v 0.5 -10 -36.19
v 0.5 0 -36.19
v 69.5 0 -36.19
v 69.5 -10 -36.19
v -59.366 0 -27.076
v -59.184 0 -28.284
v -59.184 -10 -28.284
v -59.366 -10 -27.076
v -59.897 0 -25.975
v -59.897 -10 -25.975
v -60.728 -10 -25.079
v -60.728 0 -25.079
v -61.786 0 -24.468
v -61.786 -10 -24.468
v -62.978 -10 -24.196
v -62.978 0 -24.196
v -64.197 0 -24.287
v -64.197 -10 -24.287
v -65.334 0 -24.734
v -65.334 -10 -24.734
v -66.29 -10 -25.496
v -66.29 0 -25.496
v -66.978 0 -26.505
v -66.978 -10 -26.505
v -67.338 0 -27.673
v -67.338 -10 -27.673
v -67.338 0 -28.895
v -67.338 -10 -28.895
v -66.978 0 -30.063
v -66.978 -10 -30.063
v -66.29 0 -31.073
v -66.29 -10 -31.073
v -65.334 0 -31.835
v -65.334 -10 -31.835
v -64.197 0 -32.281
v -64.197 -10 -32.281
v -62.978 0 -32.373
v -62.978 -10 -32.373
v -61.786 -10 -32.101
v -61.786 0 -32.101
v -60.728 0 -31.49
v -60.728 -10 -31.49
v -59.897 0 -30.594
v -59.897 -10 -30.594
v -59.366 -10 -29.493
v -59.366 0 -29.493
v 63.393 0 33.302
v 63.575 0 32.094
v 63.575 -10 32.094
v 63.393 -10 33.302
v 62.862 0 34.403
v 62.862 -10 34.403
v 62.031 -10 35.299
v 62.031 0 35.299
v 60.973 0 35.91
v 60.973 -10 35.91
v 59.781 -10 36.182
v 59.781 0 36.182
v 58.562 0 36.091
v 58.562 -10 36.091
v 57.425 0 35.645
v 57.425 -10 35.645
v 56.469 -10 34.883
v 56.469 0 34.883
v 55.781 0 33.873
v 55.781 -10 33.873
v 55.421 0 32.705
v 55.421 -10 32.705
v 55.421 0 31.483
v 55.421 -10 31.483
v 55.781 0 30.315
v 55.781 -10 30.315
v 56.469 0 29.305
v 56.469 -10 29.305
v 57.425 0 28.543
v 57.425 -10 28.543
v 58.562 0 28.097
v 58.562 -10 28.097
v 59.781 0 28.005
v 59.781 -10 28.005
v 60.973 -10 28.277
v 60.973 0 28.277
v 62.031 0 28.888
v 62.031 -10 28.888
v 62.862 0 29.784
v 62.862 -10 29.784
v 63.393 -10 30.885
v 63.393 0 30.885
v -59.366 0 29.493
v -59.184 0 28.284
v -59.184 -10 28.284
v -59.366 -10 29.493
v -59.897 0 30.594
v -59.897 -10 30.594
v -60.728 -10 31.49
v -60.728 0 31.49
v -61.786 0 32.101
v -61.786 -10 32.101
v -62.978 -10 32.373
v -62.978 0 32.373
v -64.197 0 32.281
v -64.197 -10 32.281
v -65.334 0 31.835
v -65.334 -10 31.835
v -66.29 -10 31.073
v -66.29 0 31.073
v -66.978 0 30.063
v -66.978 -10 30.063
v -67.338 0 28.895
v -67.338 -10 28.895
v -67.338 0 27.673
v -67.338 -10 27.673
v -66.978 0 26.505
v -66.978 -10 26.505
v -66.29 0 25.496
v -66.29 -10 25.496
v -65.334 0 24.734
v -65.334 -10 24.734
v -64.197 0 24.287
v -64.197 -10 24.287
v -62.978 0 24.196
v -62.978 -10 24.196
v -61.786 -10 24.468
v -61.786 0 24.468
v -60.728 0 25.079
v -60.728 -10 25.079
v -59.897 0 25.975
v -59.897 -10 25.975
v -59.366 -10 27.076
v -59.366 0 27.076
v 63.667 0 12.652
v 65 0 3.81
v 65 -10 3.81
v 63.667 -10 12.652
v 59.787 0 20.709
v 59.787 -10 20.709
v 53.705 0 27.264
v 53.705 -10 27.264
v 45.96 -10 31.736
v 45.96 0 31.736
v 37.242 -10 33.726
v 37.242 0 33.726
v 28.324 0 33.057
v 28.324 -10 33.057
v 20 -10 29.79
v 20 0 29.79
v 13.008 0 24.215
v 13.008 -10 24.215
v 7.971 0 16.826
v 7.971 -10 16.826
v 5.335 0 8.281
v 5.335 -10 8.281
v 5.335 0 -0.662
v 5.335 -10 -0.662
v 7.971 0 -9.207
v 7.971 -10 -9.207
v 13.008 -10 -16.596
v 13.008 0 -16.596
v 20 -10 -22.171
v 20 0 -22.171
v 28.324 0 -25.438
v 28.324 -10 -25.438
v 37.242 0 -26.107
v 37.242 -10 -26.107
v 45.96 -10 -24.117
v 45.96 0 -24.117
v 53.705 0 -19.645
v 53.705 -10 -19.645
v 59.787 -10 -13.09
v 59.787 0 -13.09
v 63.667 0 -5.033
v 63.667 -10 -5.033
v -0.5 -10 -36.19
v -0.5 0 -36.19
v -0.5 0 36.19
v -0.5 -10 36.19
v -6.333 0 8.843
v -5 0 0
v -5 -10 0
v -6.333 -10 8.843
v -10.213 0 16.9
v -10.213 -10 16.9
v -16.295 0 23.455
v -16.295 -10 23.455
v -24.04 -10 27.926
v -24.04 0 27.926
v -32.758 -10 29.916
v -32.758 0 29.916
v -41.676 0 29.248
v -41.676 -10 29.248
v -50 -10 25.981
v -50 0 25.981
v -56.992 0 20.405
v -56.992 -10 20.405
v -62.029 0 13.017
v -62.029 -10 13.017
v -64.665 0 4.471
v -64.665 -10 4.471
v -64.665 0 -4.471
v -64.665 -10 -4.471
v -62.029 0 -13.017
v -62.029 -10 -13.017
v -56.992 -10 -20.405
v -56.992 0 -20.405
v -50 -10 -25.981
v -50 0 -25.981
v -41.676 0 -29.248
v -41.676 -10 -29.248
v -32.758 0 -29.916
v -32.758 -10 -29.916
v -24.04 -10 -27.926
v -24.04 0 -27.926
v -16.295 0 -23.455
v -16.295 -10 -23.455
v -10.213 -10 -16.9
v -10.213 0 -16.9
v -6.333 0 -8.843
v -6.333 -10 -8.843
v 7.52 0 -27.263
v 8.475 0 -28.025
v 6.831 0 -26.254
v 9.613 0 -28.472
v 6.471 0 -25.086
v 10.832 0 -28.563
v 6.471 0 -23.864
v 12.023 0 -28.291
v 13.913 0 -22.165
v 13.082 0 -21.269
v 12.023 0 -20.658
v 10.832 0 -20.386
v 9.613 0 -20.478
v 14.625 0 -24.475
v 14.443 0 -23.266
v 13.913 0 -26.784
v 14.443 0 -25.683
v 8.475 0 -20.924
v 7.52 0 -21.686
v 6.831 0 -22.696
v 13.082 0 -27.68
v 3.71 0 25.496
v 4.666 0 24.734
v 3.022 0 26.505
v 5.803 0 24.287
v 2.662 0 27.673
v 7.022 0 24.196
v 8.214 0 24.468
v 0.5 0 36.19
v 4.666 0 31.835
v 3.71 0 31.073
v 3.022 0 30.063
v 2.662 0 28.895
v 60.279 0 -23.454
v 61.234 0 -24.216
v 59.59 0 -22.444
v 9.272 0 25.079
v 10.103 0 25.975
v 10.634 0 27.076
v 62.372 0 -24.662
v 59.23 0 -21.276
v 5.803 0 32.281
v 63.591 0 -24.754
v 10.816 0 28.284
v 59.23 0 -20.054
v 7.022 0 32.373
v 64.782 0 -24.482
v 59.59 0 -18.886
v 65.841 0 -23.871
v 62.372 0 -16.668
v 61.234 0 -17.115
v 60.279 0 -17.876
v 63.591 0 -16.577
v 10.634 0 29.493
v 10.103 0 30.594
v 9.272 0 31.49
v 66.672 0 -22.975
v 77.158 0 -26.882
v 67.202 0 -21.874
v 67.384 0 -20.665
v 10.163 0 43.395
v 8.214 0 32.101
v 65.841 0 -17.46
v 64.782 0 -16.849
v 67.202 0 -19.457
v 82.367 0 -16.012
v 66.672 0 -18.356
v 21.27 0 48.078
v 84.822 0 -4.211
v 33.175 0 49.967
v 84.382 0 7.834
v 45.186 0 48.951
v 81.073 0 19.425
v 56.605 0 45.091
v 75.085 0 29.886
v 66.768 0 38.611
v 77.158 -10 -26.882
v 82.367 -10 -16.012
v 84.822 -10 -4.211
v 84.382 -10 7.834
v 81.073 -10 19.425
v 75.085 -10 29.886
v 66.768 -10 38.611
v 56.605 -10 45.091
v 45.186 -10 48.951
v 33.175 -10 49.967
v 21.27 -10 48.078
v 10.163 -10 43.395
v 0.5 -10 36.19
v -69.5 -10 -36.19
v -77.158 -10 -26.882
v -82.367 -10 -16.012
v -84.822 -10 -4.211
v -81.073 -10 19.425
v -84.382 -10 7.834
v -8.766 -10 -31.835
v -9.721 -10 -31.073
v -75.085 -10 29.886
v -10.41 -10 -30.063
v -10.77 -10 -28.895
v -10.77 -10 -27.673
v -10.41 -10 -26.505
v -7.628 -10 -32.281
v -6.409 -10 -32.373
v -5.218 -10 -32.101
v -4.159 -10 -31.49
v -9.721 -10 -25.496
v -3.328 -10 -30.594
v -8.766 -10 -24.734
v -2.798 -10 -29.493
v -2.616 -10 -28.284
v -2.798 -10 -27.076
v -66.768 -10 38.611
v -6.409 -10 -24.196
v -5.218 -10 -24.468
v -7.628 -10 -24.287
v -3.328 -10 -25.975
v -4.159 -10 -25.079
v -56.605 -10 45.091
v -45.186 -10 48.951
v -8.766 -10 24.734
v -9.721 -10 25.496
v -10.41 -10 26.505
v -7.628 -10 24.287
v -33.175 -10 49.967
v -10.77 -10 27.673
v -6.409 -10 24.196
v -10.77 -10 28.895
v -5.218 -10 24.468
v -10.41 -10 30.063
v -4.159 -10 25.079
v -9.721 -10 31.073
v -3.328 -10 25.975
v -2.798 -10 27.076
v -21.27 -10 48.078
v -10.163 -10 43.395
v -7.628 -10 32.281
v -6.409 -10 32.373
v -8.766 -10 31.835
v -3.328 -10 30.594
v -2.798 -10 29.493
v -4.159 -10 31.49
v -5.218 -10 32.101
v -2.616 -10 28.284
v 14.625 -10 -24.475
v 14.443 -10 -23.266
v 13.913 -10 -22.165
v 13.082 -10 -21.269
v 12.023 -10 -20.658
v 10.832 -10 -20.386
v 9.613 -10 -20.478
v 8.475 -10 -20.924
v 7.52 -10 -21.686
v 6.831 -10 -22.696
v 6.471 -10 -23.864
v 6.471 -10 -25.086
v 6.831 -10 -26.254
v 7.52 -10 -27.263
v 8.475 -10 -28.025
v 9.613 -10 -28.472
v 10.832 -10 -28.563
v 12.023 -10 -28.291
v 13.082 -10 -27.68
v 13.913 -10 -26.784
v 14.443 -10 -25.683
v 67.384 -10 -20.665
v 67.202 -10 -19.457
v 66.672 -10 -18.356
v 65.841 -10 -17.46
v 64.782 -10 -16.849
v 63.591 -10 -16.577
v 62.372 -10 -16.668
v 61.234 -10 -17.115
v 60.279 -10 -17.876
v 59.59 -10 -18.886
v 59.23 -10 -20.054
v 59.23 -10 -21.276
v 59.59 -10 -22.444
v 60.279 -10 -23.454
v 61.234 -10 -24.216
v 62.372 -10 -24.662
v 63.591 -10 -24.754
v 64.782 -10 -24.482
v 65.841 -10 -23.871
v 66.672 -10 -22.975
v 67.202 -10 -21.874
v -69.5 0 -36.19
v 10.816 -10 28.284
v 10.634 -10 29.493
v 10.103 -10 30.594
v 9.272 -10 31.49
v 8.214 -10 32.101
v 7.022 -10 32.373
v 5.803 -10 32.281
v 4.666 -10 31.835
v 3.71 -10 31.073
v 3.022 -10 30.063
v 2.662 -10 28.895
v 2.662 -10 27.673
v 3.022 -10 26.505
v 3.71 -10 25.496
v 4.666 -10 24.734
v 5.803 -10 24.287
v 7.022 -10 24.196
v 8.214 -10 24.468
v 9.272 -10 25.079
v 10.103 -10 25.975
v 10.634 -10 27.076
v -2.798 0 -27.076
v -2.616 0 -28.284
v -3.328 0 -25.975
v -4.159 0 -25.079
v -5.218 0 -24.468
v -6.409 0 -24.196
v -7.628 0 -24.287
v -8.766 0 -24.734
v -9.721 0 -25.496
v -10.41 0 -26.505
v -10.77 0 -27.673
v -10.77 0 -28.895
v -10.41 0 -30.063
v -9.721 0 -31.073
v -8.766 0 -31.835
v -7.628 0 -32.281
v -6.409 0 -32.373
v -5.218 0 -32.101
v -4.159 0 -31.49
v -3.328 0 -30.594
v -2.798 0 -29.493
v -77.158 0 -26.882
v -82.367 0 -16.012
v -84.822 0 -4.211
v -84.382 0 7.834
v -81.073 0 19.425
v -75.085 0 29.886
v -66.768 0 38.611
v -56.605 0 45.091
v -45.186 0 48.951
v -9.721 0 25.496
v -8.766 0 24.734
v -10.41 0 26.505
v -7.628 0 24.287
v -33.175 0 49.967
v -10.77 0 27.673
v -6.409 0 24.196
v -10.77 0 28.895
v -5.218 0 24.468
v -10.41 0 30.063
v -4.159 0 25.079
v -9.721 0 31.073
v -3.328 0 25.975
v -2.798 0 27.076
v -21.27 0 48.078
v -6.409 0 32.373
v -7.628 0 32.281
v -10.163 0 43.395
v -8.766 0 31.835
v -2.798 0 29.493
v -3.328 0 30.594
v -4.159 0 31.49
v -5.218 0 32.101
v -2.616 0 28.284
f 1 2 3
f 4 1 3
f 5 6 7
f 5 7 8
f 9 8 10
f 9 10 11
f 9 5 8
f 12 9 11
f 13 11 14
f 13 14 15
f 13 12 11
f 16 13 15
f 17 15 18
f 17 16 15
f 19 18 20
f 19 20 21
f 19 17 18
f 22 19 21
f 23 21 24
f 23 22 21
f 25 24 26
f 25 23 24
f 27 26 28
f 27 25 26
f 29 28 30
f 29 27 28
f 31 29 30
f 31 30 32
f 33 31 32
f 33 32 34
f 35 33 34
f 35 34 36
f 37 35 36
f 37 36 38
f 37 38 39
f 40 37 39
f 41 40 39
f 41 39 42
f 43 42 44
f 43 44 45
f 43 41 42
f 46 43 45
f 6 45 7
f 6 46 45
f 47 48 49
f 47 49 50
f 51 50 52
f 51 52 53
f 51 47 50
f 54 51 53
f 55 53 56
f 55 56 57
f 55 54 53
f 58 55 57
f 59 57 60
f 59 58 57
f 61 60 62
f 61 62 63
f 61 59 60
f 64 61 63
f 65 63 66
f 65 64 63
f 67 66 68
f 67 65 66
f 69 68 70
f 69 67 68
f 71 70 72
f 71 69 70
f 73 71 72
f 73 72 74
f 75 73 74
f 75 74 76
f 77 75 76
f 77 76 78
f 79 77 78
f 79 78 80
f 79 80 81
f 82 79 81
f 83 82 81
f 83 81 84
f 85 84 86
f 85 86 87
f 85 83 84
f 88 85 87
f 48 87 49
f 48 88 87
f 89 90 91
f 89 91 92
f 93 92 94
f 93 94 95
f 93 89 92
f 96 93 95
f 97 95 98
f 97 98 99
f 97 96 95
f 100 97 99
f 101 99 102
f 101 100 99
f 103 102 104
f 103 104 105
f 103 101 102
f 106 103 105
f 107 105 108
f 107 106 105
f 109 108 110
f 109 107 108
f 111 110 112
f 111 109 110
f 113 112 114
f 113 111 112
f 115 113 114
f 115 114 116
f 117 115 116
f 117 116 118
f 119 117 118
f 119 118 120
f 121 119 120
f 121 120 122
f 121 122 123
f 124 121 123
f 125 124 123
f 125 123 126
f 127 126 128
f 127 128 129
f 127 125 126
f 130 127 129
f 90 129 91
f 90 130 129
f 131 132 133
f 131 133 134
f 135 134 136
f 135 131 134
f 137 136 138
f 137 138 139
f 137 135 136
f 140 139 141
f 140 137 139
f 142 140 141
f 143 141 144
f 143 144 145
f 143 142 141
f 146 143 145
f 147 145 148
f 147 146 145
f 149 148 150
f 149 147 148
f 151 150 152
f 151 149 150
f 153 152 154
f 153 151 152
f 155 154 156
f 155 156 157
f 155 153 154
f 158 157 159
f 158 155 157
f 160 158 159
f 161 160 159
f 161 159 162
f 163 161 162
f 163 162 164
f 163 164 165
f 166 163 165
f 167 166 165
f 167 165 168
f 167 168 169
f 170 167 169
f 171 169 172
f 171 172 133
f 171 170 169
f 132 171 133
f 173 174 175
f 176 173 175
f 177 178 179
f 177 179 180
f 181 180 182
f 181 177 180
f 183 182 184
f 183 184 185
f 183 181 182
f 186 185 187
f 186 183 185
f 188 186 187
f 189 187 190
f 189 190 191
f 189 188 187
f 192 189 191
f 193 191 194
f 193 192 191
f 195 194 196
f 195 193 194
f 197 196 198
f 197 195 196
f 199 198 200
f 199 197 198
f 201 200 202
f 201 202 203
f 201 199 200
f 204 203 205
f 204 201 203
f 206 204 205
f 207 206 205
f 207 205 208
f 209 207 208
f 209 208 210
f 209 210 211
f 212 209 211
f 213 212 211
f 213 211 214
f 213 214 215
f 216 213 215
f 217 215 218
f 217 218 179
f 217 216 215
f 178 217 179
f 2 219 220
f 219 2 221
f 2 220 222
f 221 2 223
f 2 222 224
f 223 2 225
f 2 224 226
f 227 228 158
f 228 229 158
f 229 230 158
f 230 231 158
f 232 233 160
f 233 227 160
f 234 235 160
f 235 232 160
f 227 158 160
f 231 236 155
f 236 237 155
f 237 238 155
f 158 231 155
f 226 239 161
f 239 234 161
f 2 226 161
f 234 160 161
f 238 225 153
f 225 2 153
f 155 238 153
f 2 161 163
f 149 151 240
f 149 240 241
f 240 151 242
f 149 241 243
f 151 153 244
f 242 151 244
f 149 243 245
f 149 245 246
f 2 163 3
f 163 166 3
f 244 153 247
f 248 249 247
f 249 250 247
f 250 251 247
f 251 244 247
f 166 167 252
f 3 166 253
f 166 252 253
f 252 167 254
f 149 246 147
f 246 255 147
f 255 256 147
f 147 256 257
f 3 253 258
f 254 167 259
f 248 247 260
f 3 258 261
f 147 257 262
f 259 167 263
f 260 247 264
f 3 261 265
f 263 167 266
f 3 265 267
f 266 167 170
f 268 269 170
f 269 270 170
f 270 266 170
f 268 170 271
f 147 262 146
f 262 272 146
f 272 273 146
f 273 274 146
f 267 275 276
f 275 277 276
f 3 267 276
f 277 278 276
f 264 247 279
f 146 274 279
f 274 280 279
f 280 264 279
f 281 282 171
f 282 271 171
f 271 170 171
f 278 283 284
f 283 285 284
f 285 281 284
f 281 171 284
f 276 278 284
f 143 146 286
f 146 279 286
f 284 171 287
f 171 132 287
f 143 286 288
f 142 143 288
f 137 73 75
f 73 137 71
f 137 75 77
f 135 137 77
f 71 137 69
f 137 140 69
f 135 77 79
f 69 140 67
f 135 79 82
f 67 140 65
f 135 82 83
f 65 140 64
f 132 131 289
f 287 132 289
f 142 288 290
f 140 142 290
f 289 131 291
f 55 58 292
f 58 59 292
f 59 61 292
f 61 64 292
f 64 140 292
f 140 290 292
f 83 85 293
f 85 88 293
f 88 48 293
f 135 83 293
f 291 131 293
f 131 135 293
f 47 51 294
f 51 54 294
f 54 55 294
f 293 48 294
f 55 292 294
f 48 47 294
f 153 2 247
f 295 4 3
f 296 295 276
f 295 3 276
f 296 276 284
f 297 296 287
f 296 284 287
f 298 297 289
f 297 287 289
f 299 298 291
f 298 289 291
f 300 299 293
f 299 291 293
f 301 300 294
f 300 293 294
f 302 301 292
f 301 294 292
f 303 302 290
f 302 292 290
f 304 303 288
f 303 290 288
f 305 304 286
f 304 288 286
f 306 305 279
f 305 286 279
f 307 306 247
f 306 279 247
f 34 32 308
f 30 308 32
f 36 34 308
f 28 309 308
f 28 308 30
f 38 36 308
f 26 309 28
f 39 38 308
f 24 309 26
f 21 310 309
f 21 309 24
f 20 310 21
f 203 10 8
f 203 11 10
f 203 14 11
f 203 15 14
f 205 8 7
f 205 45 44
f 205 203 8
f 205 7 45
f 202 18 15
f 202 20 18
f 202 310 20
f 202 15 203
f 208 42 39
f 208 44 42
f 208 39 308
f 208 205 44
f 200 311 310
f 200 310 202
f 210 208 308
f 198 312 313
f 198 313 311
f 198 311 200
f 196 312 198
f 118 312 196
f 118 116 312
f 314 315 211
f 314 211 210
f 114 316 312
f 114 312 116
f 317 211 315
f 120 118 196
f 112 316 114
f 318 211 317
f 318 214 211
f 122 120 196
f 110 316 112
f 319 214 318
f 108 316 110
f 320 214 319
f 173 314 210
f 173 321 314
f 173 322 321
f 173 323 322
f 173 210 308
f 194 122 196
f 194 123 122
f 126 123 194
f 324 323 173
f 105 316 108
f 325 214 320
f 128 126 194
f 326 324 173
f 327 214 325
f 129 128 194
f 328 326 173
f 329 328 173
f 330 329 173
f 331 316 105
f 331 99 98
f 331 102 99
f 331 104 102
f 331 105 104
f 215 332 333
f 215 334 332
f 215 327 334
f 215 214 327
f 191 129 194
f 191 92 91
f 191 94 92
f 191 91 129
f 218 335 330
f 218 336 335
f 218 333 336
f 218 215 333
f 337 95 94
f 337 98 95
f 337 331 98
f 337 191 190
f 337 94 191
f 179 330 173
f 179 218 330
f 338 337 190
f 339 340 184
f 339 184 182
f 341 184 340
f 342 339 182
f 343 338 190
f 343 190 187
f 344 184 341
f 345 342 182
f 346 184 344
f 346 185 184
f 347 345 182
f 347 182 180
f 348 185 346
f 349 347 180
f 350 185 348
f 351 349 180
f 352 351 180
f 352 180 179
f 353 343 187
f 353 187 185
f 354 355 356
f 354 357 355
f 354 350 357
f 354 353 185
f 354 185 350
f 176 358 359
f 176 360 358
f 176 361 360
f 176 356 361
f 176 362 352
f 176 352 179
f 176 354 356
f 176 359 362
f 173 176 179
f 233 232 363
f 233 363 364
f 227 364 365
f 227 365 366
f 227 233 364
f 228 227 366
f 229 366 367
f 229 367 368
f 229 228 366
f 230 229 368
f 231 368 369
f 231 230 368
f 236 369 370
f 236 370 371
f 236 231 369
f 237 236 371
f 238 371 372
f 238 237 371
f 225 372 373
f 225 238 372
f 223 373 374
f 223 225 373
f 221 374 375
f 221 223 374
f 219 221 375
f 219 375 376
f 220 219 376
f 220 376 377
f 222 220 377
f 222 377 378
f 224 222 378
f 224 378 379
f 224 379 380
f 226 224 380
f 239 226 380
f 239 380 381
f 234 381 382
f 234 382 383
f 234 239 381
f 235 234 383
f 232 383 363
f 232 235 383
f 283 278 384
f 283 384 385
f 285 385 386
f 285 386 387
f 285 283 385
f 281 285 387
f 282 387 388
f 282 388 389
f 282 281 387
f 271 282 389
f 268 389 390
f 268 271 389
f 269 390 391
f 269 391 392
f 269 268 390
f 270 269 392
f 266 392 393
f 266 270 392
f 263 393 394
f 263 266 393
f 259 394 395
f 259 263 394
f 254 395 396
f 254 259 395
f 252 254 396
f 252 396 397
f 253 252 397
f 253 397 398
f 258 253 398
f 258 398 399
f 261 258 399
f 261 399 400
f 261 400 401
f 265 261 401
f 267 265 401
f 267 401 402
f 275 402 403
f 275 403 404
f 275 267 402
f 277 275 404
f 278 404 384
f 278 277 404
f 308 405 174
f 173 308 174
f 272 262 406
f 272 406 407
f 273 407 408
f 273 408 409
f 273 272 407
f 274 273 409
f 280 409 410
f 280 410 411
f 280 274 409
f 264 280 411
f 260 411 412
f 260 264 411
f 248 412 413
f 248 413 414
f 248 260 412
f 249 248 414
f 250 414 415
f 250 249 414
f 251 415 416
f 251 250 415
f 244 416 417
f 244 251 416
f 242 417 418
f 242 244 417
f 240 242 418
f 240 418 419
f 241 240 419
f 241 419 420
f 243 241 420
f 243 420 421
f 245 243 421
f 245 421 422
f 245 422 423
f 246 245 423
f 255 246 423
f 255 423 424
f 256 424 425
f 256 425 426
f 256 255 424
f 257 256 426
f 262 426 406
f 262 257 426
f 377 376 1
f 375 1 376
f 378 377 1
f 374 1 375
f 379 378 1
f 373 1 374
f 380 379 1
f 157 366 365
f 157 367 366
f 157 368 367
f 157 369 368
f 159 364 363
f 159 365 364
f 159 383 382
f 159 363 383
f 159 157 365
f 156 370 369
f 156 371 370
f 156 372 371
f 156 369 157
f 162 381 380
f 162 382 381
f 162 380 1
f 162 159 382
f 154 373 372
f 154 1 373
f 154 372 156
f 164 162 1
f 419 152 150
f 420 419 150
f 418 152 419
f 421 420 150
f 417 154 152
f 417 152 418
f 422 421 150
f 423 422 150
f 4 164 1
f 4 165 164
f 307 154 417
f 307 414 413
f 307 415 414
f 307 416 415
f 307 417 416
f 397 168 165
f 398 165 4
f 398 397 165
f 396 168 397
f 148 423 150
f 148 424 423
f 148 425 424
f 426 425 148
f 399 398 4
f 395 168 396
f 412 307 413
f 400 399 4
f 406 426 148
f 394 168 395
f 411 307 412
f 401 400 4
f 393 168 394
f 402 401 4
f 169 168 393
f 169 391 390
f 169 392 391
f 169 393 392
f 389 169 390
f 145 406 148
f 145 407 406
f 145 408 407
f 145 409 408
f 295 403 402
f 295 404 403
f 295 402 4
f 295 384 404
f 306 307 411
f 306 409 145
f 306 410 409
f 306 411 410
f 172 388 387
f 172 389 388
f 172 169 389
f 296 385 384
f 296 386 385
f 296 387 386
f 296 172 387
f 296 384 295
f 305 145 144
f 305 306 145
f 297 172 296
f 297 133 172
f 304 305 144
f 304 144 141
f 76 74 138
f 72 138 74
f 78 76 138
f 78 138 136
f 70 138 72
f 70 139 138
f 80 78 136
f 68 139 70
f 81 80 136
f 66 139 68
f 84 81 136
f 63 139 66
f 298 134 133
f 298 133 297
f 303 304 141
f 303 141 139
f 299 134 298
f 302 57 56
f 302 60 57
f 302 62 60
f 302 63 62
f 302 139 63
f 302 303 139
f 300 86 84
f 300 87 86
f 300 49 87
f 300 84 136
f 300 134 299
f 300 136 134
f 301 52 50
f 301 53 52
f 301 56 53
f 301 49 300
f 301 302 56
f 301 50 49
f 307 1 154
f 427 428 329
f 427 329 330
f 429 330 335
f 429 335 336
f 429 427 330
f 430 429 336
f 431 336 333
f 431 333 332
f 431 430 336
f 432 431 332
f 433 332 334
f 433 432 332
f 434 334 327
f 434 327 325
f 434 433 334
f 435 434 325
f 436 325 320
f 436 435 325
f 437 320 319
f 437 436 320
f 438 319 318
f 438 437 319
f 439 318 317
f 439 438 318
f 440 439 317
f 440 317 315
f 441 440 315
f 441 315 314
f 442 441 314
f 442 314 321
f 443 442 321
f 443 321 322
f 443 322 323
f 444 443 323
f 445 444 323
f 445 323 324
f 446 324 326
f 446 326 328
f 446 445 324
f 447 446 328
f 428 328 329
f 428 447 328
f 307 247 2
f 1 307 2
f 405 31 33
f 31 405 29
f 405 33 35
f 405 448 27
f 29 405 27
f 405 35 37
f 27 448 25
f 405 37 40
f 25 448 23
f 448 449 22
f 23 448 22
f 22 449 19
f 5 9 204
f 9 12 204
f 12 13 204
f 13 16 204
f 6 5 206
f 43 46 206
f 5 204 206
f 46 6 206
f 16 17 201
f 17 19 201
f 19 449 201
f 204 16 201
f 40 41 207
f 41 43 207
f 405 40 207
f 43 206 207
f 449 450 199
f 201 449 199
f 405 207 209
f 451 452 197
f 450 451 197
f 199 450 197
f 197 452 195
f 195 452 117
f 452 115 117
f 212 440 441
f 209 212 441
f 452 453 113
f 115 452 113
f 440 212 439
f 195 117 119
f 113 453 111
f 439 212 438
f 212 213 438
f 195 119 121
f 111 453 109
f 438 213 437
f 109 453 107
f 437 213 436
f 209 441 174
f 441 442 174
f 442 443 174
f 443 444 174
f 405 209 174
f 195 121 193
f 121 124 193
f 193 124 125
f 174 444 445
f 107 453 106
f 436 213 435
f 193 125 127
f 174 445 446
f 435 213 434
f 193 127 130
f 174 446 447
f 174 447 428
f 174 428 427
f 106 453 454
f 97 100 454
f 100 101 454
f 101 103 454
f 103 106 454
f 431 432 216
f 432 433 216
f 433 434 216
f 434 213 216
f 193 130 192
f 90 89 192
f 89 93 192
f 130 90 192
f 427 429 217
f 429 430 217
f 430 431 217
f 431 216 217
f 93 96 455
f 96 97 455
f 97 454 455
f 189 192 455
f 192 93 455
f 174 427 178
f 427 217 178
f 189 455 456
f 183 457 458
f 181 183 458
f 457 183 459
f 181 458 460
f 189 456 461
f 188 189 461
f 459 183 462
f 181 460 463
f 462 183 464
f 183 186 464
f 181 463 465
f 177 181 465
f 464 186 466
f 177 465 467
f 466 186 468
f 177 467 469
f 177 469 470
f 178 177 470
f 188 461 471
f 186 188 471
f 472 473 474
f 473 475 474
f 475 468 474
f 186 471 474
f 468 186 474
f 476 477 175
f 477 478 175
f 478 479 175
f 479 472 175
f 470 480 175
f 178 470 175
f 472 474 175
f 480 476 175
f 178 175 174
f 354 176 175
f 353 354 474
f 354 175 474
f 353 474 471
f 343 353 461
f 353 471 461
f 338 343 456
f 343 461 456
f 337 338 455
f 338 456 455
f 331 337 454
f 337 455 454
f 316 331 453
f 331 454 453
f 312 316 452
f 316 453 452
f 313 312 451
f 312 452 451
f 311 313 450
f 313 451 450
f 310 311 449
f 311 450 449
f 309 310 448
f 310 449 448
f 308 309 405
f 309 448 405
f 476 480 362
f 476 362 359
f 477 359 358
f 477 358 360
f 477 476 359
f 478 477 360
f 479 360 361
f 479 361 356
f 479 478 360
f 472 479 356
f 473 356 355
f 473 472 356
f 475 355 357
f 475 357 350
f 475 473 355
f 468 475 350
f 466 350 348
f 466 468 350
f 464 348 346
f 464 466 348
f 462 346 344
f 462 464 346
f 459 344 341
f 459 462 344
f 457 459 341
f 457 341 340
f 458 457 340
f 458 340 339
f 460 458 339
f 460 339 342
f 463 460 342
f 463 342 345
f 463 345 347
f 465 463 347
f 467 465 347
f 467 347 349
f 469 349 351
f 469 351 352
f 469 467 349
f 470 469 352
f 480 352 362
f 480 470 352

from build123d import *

# Parameters (mm, degrees)
F0_R     = 4.1
F0_R_2   = 30
F1_DEPTH = 10


with BuildPart() as f1:
    # F0 (on Front) → F1 (new body)
    with BuildSketch(Plane.XZ):
        with BuildLine():
            Line((-0.5, -36.190468), (-0.5, 36.190468))
            ThreePointArc((-0.5, 36.190468), (-71.190468, 34.5), (-69.5, -36.190468))
            Line((-69.5, -36.190468), (-0.5, -36.190468))
        make_face()
        with Locations((-63.284271, -28.284271)):
            Circle(F0_R, mode=Mode.SUBTRACT)
        with Locations((-6.715729, -28.284271)):
            Circle(F0_R, mode=Mode.SUBTRACT)
        with Locations((-35, 0)):
            Circle(F0_R_2, mode=Mode.SUBTRACT)
        with Locations((-63.284271, 28.284271)):
            Circle(F0_R, mode=Mode.SUBTRACT)
        with Locations((-6.715729, 28.284271)):
            Circle(F0_R, mode=Mode.SUBTRACT)
        with BuildLine():
            Line((0.5, -36.190468), (69.5, -36.190468))
            ThreePointArc((69.5, -36.190468), (71.190468, 34.5), (0.5, 36.190468))
            Line((0.5, 36.190468), (0.5, -36.190468))
        make_face()
        with Locations((10.52526, -24.47474)):
            Circle(F0_R, mode=Mode.SUBTRACT)
        with Locations((63.284271, -20.665208)):
            Circle(F0_R, mode=Mode.SUBTRACT)
        with Locations((35, 3.809532)):
            Circle(F0_R_2, mode=Mode.SUBTRACT)
        with Locations((6.715729, 28.284271)):
            Circle(F0_R, mode=Mode.SUBTRACT)
        with Locations((59.47474, 32.093803)):
            Circle(F0_R, mode=Mode.SUBTRACT)
    extrude(amount=F1_DEPTH)


solid = f1.part
